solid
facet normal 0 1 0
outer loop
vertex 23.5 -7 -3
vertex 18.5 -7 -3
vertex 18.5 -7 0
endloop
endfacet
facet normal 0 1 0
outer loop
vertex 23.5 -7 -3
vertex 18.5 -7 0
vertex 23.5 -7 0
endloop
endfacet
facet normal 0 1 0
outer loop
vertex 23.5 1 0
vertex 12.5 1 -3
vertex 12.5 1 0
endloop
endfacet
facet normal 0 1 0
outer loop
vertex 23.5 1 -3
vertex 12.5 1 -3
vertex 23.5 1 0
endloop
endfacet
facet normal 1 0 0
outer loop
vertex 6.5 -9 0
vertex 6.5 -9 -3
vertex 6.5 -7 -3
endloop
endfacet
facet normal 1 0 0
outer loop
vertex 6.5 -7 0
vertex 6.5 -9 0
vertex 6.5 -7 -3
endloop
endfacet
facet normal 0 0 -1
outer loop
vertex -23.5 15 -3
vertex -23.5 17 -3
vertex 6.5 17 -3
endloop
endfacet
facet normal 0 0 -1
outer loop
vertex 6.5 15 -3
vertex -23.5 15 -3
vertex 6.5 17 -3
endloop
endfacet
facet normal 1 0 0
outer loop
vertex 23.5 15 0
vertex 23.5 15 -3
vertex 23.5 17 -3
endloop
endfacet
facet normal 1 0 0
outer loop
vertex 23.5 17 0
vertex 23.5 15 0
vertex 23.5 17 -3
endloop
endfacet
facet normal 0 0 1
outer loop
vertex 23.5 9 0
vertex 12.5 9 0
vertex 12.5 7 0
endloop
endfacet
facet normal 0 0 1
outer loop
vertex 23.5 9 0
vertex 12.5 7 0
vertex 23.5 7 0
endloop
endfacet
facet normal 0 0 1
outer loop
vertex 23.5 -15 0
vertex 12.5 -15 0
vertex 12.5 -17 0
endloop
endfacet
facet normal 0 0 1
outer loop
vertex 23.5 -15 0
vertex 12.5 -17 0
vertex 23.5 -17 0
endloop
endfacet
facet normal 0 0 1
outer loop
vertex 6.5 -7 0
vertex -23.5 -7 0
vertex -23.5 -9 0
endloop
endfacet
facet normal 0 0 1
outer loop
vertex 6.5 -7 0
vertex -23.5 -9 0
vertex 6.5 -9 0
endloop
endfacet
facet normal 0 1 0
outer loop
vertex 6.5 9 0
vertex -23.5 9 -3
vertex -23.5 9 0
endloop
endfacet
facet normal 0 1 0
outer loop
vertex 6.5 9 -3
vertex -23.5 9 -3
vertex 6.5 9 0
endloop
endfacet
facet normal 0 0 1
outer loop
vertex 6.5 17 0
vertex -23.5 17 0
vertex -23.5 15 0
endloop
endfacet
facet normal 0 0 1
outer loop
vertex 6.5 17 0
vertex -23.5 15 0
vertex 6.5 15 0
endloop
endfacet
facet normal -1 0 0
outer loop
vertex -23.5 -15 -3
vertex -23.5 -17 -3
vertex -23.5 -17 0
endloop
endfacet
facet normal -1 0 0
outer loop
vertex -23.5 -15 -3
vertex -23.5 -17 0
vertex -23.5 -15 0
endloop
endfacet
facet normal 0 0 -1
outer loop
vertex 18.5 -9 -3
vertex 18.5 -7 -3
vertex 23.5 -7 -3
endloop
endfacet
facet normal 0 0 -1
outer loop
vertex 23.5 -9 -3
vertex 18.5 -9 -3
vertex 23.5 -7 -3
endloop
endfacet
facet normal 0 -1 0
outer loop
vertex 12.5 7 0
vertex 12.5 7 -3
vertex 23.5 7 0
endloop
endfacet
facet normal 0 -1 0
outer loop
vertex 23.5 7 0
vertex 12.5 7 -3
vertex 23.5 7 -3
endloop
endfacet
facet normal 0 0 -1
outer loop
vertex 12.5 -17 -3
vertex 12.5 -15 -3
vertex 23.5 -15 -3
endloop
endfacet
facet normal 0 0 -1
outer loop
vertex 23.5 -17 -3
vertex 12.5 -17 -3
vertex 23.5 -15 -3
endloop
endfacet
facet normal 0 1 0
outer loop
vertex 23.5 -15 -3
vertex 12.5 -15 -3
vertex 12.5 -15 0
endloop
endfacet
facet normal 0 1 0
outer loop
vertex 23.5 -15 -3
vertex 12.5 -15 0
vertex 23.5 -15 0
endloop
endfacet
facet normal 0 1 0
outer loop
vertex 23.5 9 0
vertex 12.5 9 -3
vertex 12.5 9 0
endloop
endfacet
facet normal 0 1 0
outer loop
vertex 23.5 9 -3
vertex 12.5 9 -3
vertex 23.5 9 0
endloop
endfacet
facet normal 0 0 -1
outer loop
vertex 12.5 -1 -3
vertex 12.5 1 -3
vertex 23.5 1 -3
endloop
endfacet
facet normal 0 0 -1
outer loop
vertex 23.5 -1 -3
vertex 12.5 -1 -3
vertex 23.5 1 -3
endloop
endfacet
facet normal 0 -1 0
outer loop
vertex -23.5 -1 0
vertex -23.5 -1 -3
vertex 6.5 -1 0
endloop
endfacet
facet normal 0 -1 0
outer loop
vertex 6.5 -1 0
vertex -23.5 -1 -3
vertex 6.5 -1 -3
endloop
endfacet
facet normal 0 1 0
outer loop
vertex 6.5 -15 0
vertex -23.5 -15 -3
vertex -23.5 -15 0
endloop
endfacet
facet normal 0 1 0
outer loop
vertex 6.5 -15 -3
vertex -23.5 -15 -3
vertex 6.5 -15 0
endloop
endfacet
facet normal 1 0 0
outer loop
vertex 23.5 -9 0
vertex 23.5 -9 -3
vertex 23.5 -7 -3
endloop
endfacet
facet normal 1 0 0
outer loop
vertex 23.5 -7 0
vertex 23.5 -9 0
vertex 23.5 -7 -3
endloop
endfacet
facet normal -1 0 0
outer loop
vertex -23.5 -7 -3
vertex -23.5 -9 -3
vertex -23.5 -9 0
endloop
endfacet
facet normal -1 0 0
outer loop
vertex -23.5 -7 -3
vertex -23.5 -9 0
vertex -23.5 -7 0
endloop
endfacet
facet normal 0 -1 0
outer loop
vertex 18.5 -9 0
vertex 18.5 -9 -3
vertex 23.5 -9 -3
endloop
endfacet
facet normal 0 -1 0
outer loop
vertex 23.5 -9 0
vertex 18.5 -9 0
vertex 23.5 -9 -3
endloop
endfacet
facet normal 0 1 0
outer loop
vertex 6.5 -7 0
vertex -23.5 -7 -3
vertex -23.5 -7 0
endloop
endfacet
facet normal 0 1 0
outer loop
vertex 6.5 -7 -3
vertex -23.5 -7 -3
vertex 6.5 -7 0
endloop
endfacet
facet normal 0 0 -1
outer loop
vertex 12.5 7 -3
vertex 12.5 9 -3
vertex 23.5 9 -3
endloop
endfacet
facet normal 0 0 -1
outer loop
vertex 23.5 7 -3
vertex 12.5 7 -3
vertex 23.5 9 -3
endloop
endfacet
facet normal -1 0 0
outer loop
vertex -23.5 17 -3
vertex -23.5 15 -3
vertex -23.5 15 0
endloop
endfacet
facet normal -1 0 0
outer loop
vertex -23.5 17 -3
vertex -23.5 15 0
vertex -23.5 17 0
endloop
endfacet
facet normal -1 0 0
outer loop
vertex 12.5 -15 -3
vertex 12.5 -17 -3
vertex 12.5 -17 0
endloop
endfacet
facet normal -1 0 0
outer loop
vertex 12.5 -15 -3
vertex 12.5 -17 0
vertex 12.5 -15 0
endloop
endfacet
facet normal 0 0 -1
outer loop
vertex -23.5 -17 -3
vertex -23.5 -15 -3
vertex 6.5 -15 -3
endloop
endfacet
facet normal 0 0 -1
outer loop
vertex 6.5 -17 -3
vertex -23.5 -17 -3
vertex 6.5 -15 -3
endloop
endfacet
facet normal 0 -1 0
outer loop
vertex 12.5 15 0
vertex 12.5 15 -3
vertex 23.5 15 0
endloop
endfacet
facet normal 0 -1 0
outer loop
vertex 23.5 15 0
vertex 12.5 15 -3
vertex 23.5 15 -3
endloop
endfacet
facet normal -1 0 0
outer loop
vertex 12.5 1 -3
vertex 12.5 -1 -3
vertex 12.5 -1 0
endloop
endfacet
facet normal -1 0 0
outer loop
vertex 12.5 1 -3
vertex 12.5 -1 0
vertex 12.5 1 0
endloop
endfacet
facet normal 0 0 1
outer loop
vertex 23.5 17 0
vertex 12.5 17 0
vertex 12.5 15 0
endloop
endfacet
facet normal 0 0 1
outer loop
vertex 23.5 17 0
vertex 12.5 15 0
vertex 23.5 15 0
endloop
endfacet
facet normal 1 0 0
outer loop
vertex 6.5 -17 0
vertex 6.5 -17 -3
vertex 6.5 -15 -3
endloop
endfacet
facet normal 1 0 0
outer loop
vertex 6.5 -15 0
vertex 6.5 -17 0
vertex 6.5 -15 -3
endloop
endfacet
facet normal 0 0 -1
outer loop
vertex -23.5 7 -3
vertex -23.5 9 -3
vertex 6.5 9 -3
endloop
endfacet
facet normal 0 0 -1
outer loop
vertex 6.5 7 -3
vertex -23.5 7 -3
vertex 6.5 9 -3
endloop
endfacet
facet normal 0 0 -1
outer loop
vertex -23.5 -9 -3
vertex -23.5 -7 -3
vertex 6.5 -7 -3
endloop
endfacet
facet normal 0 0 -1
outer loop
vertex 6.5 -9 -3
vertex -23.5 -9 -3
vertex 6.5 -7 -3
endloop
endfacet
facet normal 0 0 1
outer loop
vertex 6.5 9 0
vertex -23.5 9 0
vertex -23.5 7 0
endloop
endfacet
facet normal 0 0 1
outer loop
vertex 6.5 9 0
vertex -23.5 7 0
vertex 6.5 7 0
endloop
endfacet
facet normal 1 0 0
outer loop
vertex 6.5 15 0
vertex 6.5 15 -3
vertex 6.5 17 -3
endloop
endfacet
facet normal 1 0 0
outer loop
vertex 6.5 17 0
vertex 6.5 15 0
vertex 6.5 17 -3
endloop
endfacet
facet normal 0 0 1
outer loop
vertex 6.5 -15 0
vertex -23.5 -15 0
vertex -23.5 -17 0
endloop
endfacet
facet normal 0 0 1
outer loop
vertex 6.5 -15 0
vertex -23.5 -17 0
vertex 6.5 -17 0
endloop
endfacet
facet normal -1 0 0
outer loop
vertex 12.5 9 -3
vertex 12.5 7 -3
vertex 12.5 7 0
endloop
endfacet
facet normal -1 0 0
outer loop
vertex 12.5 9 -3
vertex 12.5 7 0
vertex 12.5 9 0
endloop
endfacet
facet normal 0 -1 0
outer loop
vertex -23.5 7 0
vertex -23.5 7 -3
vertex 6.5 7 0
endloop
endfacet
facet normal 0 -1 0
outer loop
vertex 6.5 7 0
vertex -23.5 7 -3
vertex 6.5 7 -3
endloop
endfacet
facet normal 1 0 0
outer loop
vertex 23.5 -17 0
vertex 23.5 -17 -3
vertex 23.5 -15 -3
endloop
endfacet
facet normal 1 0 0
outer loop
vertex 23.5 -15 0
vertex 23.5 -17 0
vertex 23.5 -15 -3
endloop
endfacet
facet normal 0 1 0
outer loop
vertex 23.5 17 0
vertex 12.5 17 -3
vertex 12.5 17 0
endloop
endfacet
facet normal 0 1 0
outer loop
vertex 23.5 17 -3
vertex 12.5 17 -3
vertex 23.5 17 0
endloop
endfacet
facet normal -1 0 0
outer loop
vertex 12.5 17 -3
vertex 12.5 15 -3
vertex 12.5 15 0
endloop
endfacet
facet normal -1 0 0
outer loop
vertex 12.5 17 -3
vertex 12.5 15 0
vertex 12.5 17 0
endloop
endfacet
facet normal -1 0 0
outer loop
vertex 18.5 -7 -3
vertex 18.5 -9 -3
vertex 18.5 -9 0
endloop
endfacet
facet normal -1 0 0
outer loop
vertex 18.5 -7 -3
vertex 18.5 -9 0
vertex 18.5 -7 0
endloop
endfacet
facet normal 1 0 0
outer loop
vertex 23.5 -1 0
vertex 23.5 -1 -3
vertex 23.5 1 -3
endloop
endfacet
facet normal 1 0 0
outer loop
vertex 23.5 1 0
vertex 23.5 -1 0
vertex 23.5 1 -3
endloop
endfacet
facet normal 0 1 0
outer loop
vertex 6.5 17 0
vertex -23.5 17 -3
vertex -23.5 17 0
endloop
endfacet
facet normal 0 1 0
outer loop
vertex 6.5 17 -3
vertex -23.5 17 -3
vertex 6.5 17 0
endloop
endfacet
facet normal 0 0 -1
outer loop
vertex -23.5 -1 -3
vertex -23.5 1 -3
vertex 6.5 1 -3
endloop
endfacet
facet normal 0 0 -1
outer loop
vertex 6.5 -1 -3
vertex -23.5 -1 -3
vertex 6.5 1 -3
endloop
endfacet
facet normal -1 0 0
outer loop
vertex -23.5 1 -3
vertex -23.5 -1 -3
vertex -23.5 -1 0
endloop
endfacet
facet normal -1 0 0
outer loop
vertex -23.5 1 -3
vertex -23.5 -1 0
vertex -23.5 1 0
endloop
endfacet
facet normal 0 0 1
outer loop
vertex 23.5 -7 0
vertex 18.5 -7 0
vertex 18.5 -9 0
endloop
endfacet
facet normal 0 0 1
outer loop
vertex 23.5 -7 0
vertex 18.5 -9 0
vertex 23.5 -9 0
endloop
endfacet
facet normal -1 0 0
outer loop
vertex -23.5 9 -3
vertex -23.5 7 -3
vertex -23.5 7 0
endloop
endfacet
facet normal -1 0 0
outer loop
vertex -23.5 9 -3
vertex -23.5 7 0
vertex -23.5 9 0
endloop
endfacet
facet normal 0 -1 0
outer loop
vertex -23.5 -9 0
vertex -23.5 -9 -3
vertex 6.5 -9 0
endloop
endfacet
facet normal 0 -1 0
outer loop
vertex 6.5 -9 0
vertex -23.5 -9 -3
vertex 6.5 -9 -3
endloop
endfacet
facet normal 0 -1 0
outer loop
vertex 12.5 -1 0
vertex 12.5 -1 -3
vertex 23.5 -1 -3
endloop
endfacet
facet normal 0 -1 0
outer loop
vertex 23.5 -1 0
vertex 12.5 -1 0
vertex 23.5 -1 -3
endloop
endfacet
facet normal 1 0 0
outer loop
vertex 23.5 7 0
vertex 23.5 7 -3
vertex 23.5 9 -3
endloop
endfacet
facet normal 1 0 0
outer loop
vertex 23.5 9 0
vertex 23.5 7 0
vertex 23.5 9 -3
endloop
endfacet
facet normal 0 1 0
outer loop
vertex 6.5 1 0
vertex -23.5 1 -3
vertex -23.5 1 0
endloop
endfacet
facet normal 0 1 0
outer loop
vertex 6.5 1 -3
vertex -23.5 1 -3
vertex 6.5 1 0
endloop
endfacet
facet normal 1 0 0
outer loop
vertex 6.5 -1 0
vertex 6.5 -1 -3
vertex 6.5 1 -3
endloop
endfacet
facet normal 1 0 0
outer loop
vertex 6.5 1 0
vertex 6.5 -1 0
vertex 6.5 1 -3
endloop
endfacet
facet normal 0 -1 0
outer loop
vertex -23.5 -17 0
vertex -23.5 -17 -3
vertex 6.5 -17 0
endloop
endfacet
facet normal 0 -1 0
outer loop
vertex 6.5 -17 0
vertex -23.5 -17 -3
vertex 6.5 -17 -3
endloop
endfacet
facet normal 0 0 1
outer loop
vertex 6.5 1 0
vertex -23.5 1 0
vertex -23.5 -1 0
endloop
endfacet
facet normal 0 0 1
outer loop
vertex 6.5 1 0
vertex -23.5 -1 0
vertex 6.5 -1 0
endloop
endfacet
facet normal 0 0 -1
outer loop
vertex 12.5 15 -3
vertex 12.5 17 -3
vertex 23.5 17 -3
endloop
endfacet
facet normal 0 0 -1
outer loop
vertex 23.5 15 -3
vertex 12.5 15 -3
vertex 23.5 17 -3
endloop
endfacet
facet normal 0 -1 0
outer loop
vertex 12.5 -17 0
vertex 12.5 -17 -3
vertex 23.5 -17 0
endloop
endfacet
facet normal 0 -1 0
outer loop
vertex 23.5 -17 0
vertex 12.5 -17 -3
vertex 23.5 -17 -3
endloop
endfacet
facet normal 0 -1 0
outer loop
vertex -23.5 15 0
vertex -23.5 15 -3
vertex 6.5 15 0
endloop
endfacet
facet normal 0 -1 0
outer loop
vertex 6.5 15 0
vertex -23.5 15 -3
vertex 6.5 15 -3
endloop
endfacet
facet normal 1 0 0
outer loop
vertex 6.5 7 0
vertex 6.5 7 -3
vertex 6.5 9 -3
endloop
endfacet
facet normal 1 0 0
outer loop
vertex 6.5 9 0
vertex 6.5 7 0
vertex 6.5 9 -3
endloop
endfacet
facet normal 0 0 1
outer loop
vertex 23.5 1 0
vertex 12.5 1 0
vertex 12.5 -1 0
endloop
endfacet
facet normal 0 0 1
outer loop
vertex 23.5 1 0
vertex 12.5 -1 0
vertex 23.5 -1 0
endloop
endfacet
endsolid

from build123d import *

# Parameters (mm, degrees)
BOX008_W     = 6
BOX008_H     = 14
BOX008_DEPTH = 3
BOX007_W     = 6
BOX007_H     = 42
BOX007_DEPTH = 3
BOX004_W     = 47
BOX004_H     = 2
BOX004_DEPTH = 3
BOX003_W     = 47
BOX003_H     = 2
BOX003_DEPTH = 3
BOX002_W     = 47
BOX002_H     = 2
BOX002_DEPTH = 3
BOX005_W     = 47
BOX005_H     = 2
BOX005_DEPTH = 3
BOX006_W     = 47
BOX006_H     = 2
BOX006_DEPTH = 3


with BuildPart() as cube008:
    # Box008 → Box008 (new body)
    with BuildSketch(Plane(origin=(12.5, -15, -3), x_dir=(1, 0, 0), z_dir=(0, 0, 1))):
        with Locations((3, 7)):
            Rectangle(BOX008_W, BOX008_H)
    extrude(amount=BOX008_DEPTH)


with BuildPart() as fusion001:
    # Box007 → Box007 (new body)
    with BuildSketch(Plane(origin=(6.5, -21, -3), x_dir=(1, 0, 0), z_dir=(0, 0, 1))):
        with Locations((3, 21)):
            Rectangle(BOX007_W, BOX007_H)
    extrude(amount=BOX007_DEPTH)

    # Fusion001: union Cube008
    add(cube008.part)


with BuildPart() as cube004:
    # Box004 → Box004 (new body)
    with BuildSketch(Plane(origin=(-23.5, -1, -3), x_dir=(1, 0, 0), z_dir=(0, 0, 1))):
        with Locations((23.5, 1)):
            Rectangle(BOX004_W, BOX004_H)
    extrude(amount=BOX004_DEPTH)


with BuildPart() as cube003:
    # Box003 → Box003 (new body)
    with BuildSketch(Plane(origin=(-23.5, -9, -3), x_dir=(1, 0, 0), z_dir=(0, 0, 1))):
        with Locations((23.5, 1)):
            Rectangle(BOX003_W, BOX003_H)
    extrude(amount=BOX003_DEPTH)


with BuildPart() as cube002:
    # Box002 → Box002 (new body)
    with BuildSketch(Plane(origin=(-23.5, -17, -3), x_dir=(1, 0, 0), z_dir=(0, 0, 1))):
        with Locations((23.5, 1)):
            Rectangle(BOX002_W, BOX002_H)
    extrude(amount=BOX002_DEPTH)


with BuildPart() as cube005:
    # Box005 → Box005 (new body)
    with BuildSketch(Plane(origin=(-23.5, 7, -3), x_dir=(1, 0, 0), z_dir=(0, 0, 1))):
        with Locations((23.5, 1)):
            Rectangle(BOX005_W, BOX005_H)
    extrude(amount=BOX005_DEPTH)


with BuildPart() as espaciador:
    # Box006 → Box006 (new body)
    with BuildSketch(Plane(origin=(-23.5, 15, -3), x_dir=(1, 0, 0), z_dir=(0, 0, 1))):
        with Locations((23.5, 1)):
            Rectangle(BOX006_W, BOX006_H)
    extrude(amount=BOX006_DEPTH)

    # Fusion: union Cube004, Cube003, Cube002, Cube005
    add(cube004.part)
    add(cube003.part)
    add(cube002.part)
    add(cube005.part)

    # Cut002: cut Fusion001
    add(fusion001.part, mode=Mode.SUBTRACT)


solid = espaciador.part
